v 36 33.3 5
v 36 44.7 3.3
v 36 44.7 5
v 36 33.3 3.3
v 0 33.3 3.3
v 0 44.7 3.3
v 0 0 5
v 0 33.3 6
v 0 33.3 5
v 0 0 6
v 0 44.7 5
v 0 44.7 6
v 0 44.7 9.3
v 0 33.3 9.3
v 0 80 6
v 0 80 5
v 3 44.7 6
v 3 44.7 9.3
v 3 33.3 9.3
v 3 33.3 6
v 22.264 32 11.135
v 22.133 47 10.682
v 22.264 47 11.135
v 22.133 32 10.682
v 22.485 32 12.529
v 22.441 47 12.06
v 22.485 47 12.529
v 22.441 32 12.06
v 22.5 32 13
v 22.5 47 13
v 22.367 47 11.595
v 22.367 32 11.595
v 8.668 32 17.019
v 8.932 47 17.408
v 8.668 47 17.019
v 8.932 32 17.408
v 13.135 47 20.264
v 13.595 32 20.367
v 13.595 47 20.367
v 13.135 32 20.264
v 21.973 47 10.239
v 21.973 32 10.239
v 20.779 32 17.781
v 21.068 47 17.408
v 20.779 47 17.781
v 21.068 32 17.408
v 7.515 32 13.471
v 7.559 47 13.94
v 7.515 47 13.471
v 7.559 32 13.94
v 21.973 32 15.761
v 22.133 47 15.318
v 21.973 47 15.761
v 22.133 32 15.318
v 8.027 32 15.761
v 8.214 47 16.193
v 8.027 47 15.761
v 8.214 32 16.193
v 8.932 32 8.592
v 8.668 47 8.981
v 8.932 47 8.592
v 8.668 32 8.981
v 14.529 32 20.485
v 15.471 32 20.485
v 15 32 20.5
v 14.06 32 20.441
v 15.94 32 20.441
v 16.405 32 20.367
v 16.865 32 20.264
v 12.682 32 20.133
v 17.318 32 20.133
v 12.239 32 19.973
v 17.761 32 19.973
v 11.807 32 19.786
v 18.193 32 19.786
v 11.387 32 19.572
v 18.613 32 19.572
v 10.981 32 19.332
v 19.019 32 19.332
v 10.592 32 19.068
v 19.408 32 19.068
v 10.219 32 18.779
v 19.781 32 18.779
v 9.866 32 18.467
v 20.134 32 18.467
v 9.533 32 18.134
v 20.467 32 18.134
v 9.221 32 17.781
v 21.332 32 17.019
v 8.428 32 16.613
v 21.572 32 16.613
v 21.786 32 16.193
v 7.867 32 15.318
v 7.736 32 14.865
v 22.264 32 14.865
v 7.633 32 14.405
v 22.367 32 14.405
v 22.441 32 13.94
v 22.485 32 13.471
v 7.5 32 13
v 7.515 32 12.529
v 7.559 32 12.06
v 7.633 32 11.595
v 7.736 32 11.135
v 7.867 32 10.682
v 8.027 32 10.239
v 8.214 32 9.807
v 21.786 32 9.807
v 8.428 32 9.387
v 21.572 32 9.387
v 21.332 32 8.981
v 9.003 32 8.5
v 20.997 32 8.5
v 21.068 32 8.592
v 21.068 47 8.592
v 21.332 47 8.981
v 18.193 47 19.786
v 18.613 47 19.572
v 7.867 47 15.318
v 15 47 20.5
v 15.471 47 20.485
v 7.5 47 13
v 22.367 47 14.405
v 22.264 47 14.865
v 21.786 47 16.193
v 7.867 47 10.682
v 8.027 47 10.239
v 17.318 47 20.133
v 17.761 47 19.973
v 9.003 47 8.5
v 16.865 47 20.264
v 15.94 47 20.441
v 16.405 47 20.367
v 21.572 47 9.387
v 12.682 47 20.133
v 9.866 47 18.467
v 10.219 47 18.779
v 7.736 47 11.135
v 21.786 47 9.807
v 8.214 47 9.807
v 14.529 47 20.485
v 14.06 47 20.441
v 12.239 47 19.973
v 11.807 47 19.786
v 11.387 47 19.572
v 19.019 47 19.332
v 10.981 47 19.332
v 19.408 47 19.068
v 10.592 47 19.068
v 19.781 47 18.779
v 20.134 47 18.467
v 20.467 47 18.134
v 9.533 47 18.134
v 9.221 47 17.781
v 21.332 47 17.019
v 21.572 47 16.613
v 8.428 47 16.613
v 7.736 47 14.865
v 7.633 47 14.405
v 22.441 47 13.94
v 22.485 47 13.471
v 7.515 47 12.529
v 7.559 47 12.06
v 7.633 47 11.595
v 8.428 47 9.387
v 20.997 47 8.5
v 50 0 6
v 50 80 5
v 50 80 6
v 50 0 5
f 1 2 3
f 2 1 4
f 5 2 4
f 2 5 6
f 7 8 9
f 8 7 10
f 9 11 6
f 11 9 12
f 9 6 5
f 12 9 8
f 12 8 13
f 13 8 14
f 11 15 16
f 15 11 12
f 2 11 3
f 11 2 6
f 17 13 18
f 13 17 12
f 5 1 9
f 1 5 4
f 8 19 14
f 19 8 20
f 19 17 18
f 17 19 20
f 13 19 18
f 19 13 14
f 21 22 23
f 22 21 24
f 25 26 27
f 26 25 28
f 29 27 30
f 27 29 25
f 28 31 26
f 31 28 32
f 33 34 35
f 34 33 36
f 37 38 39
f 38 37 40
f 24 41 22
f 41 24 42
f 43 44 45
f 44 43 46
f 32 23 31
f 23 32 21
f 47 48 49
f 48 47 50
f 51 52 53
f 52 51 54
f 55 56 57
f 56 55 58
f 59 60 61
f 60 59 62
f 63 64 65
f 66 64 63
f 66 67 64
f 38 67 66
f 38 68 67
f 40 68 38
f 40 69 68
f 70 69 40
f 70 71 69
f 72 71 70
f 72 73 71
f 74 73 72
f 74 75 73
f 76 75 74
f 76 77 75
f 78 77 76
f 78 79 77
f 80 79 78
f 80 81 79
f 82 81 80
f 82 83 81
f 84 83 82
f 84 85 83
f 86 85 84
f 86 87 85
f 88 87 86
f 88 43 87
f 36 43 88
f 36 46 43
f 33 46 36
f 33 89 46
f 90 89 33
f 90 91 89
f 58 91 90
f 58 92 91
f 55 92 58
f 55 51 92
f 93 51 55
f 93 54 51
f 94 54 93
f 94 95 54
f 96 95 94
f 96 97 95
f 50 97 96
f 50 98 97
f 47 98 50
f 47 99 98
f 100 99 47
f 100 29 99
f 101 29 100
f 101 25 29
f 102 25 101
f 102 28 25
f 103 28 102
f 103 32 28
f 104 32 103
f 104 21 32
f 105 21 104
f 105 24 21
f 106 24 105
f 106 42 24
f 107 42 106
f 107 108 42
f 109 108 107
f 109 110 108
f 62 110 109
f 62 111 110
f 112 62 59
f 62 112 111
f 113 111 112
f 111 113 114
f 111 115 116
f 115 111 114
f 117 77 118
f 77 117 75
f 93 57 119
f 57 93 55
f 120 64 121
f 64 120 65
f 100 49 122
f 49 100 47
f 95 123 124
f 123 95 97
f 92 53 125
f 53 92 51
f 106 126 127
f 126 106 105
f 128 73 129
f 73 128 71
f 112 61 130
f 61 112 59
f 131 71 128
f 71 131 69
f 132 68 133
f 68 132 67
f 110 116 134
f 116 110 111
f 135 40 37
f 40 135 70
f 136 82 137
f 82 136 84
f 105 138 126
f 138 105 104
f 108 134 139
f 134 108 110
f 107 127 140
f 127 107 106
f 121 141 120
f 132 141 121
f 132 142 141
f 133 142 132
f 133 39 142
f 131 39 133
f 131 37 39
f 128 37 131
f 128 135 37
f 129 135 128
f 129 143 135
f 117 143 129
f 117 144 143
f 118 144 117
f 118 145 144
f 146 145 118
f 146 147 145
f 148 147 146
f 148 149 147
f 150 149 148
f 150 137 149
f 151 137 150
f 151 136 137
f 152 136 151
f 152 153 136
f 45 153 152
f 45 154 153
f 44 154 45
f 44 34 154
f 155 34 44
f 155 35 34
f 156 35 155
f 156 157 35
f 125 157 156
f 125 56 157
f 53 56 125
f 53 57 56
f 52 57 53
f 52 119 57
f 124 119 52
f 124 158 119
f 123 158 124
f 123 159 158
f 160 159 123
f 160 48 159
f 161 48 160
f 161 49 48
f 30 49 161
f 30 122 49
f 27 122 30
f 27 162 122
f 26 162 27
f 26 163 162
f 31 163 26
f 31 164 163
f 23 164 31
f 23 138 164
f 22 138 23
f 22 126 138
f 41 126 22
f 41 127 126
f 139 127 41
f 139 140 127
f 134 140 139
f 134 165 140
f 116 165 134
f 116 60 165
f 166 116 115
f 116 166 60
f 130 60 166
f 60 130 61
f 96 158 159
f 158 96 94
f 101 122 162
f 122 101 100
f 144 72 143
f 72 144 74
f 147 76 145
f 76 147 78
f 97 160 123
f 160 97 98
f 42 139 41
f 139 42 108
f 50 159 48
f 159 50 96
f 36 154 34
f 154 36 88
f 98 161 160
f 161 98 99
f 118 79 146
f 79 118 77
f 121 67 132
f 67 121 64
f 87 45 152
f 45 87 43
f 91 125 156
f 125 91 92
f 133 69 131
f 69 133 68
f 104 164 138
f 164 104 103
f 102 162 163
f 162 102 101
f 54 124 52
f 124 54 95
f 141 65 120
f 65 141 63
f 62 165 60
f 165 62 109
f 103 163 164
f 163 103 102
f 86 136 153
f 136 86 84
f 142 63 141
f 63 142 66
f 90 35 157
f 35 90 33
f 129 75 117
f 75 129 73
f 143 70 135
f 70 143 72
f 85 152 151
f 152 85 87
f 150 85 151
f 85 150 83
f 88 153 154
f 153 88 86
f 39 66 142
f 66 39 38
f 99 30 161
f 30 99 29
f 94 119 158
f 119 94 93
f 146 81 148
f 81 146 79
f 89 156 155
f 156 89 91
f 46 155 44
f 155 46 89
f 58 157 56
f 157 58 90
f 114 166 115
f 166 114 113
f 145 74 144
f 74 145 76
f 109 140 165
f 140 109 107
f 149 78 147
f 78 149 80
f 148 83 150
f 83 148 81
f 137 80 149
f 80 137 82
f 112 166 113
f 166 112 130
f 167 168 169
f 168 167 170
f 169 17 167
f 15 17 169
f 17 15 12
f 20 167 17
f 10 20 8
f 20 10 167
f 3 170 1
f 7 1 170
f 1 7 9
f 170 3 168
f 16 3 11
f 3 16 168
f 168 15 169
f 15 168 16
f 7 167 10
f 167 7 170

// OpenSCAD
module outer_box(){
 	cube([4, 6, 0.5]);
 
	//right wall
 	translate([3, 0, .5])
 		cube([12, 0.5, 1.5]);
 	//left wall
 	translate([3, 5.5, .5])
 		cube([12, 0.5, 1.5]);

	//cover
 	translate([2, .5, 2])
 		cube([1, 5, 0.5]);
 }
 
 module inner_slide(){
 	color("blue")
 		translate([-1, 1.1, 1.1]){
 			cube([12, 3.8, 0.7]);
 			cube([1, 3.8, 2]);
 	}
 }
 
module pulley(){
 % outer_box();
 inner_slide();
}


translate([3, 30, 0]) scale([3, 3, 3])
	pulley();

//base
translate([0, 0, 5]) cube([50, 80, 1]);

//roll
translate([15, 32, 13]) rotate([-90, 0, 0])
scale([1.5, 1.5, 1.5])
difference(){
	cylinder(h=10, $fn=100, r=5);
	translate([-5, 3, -5]) cube([12, 10, 25]);
}

//toilet?
